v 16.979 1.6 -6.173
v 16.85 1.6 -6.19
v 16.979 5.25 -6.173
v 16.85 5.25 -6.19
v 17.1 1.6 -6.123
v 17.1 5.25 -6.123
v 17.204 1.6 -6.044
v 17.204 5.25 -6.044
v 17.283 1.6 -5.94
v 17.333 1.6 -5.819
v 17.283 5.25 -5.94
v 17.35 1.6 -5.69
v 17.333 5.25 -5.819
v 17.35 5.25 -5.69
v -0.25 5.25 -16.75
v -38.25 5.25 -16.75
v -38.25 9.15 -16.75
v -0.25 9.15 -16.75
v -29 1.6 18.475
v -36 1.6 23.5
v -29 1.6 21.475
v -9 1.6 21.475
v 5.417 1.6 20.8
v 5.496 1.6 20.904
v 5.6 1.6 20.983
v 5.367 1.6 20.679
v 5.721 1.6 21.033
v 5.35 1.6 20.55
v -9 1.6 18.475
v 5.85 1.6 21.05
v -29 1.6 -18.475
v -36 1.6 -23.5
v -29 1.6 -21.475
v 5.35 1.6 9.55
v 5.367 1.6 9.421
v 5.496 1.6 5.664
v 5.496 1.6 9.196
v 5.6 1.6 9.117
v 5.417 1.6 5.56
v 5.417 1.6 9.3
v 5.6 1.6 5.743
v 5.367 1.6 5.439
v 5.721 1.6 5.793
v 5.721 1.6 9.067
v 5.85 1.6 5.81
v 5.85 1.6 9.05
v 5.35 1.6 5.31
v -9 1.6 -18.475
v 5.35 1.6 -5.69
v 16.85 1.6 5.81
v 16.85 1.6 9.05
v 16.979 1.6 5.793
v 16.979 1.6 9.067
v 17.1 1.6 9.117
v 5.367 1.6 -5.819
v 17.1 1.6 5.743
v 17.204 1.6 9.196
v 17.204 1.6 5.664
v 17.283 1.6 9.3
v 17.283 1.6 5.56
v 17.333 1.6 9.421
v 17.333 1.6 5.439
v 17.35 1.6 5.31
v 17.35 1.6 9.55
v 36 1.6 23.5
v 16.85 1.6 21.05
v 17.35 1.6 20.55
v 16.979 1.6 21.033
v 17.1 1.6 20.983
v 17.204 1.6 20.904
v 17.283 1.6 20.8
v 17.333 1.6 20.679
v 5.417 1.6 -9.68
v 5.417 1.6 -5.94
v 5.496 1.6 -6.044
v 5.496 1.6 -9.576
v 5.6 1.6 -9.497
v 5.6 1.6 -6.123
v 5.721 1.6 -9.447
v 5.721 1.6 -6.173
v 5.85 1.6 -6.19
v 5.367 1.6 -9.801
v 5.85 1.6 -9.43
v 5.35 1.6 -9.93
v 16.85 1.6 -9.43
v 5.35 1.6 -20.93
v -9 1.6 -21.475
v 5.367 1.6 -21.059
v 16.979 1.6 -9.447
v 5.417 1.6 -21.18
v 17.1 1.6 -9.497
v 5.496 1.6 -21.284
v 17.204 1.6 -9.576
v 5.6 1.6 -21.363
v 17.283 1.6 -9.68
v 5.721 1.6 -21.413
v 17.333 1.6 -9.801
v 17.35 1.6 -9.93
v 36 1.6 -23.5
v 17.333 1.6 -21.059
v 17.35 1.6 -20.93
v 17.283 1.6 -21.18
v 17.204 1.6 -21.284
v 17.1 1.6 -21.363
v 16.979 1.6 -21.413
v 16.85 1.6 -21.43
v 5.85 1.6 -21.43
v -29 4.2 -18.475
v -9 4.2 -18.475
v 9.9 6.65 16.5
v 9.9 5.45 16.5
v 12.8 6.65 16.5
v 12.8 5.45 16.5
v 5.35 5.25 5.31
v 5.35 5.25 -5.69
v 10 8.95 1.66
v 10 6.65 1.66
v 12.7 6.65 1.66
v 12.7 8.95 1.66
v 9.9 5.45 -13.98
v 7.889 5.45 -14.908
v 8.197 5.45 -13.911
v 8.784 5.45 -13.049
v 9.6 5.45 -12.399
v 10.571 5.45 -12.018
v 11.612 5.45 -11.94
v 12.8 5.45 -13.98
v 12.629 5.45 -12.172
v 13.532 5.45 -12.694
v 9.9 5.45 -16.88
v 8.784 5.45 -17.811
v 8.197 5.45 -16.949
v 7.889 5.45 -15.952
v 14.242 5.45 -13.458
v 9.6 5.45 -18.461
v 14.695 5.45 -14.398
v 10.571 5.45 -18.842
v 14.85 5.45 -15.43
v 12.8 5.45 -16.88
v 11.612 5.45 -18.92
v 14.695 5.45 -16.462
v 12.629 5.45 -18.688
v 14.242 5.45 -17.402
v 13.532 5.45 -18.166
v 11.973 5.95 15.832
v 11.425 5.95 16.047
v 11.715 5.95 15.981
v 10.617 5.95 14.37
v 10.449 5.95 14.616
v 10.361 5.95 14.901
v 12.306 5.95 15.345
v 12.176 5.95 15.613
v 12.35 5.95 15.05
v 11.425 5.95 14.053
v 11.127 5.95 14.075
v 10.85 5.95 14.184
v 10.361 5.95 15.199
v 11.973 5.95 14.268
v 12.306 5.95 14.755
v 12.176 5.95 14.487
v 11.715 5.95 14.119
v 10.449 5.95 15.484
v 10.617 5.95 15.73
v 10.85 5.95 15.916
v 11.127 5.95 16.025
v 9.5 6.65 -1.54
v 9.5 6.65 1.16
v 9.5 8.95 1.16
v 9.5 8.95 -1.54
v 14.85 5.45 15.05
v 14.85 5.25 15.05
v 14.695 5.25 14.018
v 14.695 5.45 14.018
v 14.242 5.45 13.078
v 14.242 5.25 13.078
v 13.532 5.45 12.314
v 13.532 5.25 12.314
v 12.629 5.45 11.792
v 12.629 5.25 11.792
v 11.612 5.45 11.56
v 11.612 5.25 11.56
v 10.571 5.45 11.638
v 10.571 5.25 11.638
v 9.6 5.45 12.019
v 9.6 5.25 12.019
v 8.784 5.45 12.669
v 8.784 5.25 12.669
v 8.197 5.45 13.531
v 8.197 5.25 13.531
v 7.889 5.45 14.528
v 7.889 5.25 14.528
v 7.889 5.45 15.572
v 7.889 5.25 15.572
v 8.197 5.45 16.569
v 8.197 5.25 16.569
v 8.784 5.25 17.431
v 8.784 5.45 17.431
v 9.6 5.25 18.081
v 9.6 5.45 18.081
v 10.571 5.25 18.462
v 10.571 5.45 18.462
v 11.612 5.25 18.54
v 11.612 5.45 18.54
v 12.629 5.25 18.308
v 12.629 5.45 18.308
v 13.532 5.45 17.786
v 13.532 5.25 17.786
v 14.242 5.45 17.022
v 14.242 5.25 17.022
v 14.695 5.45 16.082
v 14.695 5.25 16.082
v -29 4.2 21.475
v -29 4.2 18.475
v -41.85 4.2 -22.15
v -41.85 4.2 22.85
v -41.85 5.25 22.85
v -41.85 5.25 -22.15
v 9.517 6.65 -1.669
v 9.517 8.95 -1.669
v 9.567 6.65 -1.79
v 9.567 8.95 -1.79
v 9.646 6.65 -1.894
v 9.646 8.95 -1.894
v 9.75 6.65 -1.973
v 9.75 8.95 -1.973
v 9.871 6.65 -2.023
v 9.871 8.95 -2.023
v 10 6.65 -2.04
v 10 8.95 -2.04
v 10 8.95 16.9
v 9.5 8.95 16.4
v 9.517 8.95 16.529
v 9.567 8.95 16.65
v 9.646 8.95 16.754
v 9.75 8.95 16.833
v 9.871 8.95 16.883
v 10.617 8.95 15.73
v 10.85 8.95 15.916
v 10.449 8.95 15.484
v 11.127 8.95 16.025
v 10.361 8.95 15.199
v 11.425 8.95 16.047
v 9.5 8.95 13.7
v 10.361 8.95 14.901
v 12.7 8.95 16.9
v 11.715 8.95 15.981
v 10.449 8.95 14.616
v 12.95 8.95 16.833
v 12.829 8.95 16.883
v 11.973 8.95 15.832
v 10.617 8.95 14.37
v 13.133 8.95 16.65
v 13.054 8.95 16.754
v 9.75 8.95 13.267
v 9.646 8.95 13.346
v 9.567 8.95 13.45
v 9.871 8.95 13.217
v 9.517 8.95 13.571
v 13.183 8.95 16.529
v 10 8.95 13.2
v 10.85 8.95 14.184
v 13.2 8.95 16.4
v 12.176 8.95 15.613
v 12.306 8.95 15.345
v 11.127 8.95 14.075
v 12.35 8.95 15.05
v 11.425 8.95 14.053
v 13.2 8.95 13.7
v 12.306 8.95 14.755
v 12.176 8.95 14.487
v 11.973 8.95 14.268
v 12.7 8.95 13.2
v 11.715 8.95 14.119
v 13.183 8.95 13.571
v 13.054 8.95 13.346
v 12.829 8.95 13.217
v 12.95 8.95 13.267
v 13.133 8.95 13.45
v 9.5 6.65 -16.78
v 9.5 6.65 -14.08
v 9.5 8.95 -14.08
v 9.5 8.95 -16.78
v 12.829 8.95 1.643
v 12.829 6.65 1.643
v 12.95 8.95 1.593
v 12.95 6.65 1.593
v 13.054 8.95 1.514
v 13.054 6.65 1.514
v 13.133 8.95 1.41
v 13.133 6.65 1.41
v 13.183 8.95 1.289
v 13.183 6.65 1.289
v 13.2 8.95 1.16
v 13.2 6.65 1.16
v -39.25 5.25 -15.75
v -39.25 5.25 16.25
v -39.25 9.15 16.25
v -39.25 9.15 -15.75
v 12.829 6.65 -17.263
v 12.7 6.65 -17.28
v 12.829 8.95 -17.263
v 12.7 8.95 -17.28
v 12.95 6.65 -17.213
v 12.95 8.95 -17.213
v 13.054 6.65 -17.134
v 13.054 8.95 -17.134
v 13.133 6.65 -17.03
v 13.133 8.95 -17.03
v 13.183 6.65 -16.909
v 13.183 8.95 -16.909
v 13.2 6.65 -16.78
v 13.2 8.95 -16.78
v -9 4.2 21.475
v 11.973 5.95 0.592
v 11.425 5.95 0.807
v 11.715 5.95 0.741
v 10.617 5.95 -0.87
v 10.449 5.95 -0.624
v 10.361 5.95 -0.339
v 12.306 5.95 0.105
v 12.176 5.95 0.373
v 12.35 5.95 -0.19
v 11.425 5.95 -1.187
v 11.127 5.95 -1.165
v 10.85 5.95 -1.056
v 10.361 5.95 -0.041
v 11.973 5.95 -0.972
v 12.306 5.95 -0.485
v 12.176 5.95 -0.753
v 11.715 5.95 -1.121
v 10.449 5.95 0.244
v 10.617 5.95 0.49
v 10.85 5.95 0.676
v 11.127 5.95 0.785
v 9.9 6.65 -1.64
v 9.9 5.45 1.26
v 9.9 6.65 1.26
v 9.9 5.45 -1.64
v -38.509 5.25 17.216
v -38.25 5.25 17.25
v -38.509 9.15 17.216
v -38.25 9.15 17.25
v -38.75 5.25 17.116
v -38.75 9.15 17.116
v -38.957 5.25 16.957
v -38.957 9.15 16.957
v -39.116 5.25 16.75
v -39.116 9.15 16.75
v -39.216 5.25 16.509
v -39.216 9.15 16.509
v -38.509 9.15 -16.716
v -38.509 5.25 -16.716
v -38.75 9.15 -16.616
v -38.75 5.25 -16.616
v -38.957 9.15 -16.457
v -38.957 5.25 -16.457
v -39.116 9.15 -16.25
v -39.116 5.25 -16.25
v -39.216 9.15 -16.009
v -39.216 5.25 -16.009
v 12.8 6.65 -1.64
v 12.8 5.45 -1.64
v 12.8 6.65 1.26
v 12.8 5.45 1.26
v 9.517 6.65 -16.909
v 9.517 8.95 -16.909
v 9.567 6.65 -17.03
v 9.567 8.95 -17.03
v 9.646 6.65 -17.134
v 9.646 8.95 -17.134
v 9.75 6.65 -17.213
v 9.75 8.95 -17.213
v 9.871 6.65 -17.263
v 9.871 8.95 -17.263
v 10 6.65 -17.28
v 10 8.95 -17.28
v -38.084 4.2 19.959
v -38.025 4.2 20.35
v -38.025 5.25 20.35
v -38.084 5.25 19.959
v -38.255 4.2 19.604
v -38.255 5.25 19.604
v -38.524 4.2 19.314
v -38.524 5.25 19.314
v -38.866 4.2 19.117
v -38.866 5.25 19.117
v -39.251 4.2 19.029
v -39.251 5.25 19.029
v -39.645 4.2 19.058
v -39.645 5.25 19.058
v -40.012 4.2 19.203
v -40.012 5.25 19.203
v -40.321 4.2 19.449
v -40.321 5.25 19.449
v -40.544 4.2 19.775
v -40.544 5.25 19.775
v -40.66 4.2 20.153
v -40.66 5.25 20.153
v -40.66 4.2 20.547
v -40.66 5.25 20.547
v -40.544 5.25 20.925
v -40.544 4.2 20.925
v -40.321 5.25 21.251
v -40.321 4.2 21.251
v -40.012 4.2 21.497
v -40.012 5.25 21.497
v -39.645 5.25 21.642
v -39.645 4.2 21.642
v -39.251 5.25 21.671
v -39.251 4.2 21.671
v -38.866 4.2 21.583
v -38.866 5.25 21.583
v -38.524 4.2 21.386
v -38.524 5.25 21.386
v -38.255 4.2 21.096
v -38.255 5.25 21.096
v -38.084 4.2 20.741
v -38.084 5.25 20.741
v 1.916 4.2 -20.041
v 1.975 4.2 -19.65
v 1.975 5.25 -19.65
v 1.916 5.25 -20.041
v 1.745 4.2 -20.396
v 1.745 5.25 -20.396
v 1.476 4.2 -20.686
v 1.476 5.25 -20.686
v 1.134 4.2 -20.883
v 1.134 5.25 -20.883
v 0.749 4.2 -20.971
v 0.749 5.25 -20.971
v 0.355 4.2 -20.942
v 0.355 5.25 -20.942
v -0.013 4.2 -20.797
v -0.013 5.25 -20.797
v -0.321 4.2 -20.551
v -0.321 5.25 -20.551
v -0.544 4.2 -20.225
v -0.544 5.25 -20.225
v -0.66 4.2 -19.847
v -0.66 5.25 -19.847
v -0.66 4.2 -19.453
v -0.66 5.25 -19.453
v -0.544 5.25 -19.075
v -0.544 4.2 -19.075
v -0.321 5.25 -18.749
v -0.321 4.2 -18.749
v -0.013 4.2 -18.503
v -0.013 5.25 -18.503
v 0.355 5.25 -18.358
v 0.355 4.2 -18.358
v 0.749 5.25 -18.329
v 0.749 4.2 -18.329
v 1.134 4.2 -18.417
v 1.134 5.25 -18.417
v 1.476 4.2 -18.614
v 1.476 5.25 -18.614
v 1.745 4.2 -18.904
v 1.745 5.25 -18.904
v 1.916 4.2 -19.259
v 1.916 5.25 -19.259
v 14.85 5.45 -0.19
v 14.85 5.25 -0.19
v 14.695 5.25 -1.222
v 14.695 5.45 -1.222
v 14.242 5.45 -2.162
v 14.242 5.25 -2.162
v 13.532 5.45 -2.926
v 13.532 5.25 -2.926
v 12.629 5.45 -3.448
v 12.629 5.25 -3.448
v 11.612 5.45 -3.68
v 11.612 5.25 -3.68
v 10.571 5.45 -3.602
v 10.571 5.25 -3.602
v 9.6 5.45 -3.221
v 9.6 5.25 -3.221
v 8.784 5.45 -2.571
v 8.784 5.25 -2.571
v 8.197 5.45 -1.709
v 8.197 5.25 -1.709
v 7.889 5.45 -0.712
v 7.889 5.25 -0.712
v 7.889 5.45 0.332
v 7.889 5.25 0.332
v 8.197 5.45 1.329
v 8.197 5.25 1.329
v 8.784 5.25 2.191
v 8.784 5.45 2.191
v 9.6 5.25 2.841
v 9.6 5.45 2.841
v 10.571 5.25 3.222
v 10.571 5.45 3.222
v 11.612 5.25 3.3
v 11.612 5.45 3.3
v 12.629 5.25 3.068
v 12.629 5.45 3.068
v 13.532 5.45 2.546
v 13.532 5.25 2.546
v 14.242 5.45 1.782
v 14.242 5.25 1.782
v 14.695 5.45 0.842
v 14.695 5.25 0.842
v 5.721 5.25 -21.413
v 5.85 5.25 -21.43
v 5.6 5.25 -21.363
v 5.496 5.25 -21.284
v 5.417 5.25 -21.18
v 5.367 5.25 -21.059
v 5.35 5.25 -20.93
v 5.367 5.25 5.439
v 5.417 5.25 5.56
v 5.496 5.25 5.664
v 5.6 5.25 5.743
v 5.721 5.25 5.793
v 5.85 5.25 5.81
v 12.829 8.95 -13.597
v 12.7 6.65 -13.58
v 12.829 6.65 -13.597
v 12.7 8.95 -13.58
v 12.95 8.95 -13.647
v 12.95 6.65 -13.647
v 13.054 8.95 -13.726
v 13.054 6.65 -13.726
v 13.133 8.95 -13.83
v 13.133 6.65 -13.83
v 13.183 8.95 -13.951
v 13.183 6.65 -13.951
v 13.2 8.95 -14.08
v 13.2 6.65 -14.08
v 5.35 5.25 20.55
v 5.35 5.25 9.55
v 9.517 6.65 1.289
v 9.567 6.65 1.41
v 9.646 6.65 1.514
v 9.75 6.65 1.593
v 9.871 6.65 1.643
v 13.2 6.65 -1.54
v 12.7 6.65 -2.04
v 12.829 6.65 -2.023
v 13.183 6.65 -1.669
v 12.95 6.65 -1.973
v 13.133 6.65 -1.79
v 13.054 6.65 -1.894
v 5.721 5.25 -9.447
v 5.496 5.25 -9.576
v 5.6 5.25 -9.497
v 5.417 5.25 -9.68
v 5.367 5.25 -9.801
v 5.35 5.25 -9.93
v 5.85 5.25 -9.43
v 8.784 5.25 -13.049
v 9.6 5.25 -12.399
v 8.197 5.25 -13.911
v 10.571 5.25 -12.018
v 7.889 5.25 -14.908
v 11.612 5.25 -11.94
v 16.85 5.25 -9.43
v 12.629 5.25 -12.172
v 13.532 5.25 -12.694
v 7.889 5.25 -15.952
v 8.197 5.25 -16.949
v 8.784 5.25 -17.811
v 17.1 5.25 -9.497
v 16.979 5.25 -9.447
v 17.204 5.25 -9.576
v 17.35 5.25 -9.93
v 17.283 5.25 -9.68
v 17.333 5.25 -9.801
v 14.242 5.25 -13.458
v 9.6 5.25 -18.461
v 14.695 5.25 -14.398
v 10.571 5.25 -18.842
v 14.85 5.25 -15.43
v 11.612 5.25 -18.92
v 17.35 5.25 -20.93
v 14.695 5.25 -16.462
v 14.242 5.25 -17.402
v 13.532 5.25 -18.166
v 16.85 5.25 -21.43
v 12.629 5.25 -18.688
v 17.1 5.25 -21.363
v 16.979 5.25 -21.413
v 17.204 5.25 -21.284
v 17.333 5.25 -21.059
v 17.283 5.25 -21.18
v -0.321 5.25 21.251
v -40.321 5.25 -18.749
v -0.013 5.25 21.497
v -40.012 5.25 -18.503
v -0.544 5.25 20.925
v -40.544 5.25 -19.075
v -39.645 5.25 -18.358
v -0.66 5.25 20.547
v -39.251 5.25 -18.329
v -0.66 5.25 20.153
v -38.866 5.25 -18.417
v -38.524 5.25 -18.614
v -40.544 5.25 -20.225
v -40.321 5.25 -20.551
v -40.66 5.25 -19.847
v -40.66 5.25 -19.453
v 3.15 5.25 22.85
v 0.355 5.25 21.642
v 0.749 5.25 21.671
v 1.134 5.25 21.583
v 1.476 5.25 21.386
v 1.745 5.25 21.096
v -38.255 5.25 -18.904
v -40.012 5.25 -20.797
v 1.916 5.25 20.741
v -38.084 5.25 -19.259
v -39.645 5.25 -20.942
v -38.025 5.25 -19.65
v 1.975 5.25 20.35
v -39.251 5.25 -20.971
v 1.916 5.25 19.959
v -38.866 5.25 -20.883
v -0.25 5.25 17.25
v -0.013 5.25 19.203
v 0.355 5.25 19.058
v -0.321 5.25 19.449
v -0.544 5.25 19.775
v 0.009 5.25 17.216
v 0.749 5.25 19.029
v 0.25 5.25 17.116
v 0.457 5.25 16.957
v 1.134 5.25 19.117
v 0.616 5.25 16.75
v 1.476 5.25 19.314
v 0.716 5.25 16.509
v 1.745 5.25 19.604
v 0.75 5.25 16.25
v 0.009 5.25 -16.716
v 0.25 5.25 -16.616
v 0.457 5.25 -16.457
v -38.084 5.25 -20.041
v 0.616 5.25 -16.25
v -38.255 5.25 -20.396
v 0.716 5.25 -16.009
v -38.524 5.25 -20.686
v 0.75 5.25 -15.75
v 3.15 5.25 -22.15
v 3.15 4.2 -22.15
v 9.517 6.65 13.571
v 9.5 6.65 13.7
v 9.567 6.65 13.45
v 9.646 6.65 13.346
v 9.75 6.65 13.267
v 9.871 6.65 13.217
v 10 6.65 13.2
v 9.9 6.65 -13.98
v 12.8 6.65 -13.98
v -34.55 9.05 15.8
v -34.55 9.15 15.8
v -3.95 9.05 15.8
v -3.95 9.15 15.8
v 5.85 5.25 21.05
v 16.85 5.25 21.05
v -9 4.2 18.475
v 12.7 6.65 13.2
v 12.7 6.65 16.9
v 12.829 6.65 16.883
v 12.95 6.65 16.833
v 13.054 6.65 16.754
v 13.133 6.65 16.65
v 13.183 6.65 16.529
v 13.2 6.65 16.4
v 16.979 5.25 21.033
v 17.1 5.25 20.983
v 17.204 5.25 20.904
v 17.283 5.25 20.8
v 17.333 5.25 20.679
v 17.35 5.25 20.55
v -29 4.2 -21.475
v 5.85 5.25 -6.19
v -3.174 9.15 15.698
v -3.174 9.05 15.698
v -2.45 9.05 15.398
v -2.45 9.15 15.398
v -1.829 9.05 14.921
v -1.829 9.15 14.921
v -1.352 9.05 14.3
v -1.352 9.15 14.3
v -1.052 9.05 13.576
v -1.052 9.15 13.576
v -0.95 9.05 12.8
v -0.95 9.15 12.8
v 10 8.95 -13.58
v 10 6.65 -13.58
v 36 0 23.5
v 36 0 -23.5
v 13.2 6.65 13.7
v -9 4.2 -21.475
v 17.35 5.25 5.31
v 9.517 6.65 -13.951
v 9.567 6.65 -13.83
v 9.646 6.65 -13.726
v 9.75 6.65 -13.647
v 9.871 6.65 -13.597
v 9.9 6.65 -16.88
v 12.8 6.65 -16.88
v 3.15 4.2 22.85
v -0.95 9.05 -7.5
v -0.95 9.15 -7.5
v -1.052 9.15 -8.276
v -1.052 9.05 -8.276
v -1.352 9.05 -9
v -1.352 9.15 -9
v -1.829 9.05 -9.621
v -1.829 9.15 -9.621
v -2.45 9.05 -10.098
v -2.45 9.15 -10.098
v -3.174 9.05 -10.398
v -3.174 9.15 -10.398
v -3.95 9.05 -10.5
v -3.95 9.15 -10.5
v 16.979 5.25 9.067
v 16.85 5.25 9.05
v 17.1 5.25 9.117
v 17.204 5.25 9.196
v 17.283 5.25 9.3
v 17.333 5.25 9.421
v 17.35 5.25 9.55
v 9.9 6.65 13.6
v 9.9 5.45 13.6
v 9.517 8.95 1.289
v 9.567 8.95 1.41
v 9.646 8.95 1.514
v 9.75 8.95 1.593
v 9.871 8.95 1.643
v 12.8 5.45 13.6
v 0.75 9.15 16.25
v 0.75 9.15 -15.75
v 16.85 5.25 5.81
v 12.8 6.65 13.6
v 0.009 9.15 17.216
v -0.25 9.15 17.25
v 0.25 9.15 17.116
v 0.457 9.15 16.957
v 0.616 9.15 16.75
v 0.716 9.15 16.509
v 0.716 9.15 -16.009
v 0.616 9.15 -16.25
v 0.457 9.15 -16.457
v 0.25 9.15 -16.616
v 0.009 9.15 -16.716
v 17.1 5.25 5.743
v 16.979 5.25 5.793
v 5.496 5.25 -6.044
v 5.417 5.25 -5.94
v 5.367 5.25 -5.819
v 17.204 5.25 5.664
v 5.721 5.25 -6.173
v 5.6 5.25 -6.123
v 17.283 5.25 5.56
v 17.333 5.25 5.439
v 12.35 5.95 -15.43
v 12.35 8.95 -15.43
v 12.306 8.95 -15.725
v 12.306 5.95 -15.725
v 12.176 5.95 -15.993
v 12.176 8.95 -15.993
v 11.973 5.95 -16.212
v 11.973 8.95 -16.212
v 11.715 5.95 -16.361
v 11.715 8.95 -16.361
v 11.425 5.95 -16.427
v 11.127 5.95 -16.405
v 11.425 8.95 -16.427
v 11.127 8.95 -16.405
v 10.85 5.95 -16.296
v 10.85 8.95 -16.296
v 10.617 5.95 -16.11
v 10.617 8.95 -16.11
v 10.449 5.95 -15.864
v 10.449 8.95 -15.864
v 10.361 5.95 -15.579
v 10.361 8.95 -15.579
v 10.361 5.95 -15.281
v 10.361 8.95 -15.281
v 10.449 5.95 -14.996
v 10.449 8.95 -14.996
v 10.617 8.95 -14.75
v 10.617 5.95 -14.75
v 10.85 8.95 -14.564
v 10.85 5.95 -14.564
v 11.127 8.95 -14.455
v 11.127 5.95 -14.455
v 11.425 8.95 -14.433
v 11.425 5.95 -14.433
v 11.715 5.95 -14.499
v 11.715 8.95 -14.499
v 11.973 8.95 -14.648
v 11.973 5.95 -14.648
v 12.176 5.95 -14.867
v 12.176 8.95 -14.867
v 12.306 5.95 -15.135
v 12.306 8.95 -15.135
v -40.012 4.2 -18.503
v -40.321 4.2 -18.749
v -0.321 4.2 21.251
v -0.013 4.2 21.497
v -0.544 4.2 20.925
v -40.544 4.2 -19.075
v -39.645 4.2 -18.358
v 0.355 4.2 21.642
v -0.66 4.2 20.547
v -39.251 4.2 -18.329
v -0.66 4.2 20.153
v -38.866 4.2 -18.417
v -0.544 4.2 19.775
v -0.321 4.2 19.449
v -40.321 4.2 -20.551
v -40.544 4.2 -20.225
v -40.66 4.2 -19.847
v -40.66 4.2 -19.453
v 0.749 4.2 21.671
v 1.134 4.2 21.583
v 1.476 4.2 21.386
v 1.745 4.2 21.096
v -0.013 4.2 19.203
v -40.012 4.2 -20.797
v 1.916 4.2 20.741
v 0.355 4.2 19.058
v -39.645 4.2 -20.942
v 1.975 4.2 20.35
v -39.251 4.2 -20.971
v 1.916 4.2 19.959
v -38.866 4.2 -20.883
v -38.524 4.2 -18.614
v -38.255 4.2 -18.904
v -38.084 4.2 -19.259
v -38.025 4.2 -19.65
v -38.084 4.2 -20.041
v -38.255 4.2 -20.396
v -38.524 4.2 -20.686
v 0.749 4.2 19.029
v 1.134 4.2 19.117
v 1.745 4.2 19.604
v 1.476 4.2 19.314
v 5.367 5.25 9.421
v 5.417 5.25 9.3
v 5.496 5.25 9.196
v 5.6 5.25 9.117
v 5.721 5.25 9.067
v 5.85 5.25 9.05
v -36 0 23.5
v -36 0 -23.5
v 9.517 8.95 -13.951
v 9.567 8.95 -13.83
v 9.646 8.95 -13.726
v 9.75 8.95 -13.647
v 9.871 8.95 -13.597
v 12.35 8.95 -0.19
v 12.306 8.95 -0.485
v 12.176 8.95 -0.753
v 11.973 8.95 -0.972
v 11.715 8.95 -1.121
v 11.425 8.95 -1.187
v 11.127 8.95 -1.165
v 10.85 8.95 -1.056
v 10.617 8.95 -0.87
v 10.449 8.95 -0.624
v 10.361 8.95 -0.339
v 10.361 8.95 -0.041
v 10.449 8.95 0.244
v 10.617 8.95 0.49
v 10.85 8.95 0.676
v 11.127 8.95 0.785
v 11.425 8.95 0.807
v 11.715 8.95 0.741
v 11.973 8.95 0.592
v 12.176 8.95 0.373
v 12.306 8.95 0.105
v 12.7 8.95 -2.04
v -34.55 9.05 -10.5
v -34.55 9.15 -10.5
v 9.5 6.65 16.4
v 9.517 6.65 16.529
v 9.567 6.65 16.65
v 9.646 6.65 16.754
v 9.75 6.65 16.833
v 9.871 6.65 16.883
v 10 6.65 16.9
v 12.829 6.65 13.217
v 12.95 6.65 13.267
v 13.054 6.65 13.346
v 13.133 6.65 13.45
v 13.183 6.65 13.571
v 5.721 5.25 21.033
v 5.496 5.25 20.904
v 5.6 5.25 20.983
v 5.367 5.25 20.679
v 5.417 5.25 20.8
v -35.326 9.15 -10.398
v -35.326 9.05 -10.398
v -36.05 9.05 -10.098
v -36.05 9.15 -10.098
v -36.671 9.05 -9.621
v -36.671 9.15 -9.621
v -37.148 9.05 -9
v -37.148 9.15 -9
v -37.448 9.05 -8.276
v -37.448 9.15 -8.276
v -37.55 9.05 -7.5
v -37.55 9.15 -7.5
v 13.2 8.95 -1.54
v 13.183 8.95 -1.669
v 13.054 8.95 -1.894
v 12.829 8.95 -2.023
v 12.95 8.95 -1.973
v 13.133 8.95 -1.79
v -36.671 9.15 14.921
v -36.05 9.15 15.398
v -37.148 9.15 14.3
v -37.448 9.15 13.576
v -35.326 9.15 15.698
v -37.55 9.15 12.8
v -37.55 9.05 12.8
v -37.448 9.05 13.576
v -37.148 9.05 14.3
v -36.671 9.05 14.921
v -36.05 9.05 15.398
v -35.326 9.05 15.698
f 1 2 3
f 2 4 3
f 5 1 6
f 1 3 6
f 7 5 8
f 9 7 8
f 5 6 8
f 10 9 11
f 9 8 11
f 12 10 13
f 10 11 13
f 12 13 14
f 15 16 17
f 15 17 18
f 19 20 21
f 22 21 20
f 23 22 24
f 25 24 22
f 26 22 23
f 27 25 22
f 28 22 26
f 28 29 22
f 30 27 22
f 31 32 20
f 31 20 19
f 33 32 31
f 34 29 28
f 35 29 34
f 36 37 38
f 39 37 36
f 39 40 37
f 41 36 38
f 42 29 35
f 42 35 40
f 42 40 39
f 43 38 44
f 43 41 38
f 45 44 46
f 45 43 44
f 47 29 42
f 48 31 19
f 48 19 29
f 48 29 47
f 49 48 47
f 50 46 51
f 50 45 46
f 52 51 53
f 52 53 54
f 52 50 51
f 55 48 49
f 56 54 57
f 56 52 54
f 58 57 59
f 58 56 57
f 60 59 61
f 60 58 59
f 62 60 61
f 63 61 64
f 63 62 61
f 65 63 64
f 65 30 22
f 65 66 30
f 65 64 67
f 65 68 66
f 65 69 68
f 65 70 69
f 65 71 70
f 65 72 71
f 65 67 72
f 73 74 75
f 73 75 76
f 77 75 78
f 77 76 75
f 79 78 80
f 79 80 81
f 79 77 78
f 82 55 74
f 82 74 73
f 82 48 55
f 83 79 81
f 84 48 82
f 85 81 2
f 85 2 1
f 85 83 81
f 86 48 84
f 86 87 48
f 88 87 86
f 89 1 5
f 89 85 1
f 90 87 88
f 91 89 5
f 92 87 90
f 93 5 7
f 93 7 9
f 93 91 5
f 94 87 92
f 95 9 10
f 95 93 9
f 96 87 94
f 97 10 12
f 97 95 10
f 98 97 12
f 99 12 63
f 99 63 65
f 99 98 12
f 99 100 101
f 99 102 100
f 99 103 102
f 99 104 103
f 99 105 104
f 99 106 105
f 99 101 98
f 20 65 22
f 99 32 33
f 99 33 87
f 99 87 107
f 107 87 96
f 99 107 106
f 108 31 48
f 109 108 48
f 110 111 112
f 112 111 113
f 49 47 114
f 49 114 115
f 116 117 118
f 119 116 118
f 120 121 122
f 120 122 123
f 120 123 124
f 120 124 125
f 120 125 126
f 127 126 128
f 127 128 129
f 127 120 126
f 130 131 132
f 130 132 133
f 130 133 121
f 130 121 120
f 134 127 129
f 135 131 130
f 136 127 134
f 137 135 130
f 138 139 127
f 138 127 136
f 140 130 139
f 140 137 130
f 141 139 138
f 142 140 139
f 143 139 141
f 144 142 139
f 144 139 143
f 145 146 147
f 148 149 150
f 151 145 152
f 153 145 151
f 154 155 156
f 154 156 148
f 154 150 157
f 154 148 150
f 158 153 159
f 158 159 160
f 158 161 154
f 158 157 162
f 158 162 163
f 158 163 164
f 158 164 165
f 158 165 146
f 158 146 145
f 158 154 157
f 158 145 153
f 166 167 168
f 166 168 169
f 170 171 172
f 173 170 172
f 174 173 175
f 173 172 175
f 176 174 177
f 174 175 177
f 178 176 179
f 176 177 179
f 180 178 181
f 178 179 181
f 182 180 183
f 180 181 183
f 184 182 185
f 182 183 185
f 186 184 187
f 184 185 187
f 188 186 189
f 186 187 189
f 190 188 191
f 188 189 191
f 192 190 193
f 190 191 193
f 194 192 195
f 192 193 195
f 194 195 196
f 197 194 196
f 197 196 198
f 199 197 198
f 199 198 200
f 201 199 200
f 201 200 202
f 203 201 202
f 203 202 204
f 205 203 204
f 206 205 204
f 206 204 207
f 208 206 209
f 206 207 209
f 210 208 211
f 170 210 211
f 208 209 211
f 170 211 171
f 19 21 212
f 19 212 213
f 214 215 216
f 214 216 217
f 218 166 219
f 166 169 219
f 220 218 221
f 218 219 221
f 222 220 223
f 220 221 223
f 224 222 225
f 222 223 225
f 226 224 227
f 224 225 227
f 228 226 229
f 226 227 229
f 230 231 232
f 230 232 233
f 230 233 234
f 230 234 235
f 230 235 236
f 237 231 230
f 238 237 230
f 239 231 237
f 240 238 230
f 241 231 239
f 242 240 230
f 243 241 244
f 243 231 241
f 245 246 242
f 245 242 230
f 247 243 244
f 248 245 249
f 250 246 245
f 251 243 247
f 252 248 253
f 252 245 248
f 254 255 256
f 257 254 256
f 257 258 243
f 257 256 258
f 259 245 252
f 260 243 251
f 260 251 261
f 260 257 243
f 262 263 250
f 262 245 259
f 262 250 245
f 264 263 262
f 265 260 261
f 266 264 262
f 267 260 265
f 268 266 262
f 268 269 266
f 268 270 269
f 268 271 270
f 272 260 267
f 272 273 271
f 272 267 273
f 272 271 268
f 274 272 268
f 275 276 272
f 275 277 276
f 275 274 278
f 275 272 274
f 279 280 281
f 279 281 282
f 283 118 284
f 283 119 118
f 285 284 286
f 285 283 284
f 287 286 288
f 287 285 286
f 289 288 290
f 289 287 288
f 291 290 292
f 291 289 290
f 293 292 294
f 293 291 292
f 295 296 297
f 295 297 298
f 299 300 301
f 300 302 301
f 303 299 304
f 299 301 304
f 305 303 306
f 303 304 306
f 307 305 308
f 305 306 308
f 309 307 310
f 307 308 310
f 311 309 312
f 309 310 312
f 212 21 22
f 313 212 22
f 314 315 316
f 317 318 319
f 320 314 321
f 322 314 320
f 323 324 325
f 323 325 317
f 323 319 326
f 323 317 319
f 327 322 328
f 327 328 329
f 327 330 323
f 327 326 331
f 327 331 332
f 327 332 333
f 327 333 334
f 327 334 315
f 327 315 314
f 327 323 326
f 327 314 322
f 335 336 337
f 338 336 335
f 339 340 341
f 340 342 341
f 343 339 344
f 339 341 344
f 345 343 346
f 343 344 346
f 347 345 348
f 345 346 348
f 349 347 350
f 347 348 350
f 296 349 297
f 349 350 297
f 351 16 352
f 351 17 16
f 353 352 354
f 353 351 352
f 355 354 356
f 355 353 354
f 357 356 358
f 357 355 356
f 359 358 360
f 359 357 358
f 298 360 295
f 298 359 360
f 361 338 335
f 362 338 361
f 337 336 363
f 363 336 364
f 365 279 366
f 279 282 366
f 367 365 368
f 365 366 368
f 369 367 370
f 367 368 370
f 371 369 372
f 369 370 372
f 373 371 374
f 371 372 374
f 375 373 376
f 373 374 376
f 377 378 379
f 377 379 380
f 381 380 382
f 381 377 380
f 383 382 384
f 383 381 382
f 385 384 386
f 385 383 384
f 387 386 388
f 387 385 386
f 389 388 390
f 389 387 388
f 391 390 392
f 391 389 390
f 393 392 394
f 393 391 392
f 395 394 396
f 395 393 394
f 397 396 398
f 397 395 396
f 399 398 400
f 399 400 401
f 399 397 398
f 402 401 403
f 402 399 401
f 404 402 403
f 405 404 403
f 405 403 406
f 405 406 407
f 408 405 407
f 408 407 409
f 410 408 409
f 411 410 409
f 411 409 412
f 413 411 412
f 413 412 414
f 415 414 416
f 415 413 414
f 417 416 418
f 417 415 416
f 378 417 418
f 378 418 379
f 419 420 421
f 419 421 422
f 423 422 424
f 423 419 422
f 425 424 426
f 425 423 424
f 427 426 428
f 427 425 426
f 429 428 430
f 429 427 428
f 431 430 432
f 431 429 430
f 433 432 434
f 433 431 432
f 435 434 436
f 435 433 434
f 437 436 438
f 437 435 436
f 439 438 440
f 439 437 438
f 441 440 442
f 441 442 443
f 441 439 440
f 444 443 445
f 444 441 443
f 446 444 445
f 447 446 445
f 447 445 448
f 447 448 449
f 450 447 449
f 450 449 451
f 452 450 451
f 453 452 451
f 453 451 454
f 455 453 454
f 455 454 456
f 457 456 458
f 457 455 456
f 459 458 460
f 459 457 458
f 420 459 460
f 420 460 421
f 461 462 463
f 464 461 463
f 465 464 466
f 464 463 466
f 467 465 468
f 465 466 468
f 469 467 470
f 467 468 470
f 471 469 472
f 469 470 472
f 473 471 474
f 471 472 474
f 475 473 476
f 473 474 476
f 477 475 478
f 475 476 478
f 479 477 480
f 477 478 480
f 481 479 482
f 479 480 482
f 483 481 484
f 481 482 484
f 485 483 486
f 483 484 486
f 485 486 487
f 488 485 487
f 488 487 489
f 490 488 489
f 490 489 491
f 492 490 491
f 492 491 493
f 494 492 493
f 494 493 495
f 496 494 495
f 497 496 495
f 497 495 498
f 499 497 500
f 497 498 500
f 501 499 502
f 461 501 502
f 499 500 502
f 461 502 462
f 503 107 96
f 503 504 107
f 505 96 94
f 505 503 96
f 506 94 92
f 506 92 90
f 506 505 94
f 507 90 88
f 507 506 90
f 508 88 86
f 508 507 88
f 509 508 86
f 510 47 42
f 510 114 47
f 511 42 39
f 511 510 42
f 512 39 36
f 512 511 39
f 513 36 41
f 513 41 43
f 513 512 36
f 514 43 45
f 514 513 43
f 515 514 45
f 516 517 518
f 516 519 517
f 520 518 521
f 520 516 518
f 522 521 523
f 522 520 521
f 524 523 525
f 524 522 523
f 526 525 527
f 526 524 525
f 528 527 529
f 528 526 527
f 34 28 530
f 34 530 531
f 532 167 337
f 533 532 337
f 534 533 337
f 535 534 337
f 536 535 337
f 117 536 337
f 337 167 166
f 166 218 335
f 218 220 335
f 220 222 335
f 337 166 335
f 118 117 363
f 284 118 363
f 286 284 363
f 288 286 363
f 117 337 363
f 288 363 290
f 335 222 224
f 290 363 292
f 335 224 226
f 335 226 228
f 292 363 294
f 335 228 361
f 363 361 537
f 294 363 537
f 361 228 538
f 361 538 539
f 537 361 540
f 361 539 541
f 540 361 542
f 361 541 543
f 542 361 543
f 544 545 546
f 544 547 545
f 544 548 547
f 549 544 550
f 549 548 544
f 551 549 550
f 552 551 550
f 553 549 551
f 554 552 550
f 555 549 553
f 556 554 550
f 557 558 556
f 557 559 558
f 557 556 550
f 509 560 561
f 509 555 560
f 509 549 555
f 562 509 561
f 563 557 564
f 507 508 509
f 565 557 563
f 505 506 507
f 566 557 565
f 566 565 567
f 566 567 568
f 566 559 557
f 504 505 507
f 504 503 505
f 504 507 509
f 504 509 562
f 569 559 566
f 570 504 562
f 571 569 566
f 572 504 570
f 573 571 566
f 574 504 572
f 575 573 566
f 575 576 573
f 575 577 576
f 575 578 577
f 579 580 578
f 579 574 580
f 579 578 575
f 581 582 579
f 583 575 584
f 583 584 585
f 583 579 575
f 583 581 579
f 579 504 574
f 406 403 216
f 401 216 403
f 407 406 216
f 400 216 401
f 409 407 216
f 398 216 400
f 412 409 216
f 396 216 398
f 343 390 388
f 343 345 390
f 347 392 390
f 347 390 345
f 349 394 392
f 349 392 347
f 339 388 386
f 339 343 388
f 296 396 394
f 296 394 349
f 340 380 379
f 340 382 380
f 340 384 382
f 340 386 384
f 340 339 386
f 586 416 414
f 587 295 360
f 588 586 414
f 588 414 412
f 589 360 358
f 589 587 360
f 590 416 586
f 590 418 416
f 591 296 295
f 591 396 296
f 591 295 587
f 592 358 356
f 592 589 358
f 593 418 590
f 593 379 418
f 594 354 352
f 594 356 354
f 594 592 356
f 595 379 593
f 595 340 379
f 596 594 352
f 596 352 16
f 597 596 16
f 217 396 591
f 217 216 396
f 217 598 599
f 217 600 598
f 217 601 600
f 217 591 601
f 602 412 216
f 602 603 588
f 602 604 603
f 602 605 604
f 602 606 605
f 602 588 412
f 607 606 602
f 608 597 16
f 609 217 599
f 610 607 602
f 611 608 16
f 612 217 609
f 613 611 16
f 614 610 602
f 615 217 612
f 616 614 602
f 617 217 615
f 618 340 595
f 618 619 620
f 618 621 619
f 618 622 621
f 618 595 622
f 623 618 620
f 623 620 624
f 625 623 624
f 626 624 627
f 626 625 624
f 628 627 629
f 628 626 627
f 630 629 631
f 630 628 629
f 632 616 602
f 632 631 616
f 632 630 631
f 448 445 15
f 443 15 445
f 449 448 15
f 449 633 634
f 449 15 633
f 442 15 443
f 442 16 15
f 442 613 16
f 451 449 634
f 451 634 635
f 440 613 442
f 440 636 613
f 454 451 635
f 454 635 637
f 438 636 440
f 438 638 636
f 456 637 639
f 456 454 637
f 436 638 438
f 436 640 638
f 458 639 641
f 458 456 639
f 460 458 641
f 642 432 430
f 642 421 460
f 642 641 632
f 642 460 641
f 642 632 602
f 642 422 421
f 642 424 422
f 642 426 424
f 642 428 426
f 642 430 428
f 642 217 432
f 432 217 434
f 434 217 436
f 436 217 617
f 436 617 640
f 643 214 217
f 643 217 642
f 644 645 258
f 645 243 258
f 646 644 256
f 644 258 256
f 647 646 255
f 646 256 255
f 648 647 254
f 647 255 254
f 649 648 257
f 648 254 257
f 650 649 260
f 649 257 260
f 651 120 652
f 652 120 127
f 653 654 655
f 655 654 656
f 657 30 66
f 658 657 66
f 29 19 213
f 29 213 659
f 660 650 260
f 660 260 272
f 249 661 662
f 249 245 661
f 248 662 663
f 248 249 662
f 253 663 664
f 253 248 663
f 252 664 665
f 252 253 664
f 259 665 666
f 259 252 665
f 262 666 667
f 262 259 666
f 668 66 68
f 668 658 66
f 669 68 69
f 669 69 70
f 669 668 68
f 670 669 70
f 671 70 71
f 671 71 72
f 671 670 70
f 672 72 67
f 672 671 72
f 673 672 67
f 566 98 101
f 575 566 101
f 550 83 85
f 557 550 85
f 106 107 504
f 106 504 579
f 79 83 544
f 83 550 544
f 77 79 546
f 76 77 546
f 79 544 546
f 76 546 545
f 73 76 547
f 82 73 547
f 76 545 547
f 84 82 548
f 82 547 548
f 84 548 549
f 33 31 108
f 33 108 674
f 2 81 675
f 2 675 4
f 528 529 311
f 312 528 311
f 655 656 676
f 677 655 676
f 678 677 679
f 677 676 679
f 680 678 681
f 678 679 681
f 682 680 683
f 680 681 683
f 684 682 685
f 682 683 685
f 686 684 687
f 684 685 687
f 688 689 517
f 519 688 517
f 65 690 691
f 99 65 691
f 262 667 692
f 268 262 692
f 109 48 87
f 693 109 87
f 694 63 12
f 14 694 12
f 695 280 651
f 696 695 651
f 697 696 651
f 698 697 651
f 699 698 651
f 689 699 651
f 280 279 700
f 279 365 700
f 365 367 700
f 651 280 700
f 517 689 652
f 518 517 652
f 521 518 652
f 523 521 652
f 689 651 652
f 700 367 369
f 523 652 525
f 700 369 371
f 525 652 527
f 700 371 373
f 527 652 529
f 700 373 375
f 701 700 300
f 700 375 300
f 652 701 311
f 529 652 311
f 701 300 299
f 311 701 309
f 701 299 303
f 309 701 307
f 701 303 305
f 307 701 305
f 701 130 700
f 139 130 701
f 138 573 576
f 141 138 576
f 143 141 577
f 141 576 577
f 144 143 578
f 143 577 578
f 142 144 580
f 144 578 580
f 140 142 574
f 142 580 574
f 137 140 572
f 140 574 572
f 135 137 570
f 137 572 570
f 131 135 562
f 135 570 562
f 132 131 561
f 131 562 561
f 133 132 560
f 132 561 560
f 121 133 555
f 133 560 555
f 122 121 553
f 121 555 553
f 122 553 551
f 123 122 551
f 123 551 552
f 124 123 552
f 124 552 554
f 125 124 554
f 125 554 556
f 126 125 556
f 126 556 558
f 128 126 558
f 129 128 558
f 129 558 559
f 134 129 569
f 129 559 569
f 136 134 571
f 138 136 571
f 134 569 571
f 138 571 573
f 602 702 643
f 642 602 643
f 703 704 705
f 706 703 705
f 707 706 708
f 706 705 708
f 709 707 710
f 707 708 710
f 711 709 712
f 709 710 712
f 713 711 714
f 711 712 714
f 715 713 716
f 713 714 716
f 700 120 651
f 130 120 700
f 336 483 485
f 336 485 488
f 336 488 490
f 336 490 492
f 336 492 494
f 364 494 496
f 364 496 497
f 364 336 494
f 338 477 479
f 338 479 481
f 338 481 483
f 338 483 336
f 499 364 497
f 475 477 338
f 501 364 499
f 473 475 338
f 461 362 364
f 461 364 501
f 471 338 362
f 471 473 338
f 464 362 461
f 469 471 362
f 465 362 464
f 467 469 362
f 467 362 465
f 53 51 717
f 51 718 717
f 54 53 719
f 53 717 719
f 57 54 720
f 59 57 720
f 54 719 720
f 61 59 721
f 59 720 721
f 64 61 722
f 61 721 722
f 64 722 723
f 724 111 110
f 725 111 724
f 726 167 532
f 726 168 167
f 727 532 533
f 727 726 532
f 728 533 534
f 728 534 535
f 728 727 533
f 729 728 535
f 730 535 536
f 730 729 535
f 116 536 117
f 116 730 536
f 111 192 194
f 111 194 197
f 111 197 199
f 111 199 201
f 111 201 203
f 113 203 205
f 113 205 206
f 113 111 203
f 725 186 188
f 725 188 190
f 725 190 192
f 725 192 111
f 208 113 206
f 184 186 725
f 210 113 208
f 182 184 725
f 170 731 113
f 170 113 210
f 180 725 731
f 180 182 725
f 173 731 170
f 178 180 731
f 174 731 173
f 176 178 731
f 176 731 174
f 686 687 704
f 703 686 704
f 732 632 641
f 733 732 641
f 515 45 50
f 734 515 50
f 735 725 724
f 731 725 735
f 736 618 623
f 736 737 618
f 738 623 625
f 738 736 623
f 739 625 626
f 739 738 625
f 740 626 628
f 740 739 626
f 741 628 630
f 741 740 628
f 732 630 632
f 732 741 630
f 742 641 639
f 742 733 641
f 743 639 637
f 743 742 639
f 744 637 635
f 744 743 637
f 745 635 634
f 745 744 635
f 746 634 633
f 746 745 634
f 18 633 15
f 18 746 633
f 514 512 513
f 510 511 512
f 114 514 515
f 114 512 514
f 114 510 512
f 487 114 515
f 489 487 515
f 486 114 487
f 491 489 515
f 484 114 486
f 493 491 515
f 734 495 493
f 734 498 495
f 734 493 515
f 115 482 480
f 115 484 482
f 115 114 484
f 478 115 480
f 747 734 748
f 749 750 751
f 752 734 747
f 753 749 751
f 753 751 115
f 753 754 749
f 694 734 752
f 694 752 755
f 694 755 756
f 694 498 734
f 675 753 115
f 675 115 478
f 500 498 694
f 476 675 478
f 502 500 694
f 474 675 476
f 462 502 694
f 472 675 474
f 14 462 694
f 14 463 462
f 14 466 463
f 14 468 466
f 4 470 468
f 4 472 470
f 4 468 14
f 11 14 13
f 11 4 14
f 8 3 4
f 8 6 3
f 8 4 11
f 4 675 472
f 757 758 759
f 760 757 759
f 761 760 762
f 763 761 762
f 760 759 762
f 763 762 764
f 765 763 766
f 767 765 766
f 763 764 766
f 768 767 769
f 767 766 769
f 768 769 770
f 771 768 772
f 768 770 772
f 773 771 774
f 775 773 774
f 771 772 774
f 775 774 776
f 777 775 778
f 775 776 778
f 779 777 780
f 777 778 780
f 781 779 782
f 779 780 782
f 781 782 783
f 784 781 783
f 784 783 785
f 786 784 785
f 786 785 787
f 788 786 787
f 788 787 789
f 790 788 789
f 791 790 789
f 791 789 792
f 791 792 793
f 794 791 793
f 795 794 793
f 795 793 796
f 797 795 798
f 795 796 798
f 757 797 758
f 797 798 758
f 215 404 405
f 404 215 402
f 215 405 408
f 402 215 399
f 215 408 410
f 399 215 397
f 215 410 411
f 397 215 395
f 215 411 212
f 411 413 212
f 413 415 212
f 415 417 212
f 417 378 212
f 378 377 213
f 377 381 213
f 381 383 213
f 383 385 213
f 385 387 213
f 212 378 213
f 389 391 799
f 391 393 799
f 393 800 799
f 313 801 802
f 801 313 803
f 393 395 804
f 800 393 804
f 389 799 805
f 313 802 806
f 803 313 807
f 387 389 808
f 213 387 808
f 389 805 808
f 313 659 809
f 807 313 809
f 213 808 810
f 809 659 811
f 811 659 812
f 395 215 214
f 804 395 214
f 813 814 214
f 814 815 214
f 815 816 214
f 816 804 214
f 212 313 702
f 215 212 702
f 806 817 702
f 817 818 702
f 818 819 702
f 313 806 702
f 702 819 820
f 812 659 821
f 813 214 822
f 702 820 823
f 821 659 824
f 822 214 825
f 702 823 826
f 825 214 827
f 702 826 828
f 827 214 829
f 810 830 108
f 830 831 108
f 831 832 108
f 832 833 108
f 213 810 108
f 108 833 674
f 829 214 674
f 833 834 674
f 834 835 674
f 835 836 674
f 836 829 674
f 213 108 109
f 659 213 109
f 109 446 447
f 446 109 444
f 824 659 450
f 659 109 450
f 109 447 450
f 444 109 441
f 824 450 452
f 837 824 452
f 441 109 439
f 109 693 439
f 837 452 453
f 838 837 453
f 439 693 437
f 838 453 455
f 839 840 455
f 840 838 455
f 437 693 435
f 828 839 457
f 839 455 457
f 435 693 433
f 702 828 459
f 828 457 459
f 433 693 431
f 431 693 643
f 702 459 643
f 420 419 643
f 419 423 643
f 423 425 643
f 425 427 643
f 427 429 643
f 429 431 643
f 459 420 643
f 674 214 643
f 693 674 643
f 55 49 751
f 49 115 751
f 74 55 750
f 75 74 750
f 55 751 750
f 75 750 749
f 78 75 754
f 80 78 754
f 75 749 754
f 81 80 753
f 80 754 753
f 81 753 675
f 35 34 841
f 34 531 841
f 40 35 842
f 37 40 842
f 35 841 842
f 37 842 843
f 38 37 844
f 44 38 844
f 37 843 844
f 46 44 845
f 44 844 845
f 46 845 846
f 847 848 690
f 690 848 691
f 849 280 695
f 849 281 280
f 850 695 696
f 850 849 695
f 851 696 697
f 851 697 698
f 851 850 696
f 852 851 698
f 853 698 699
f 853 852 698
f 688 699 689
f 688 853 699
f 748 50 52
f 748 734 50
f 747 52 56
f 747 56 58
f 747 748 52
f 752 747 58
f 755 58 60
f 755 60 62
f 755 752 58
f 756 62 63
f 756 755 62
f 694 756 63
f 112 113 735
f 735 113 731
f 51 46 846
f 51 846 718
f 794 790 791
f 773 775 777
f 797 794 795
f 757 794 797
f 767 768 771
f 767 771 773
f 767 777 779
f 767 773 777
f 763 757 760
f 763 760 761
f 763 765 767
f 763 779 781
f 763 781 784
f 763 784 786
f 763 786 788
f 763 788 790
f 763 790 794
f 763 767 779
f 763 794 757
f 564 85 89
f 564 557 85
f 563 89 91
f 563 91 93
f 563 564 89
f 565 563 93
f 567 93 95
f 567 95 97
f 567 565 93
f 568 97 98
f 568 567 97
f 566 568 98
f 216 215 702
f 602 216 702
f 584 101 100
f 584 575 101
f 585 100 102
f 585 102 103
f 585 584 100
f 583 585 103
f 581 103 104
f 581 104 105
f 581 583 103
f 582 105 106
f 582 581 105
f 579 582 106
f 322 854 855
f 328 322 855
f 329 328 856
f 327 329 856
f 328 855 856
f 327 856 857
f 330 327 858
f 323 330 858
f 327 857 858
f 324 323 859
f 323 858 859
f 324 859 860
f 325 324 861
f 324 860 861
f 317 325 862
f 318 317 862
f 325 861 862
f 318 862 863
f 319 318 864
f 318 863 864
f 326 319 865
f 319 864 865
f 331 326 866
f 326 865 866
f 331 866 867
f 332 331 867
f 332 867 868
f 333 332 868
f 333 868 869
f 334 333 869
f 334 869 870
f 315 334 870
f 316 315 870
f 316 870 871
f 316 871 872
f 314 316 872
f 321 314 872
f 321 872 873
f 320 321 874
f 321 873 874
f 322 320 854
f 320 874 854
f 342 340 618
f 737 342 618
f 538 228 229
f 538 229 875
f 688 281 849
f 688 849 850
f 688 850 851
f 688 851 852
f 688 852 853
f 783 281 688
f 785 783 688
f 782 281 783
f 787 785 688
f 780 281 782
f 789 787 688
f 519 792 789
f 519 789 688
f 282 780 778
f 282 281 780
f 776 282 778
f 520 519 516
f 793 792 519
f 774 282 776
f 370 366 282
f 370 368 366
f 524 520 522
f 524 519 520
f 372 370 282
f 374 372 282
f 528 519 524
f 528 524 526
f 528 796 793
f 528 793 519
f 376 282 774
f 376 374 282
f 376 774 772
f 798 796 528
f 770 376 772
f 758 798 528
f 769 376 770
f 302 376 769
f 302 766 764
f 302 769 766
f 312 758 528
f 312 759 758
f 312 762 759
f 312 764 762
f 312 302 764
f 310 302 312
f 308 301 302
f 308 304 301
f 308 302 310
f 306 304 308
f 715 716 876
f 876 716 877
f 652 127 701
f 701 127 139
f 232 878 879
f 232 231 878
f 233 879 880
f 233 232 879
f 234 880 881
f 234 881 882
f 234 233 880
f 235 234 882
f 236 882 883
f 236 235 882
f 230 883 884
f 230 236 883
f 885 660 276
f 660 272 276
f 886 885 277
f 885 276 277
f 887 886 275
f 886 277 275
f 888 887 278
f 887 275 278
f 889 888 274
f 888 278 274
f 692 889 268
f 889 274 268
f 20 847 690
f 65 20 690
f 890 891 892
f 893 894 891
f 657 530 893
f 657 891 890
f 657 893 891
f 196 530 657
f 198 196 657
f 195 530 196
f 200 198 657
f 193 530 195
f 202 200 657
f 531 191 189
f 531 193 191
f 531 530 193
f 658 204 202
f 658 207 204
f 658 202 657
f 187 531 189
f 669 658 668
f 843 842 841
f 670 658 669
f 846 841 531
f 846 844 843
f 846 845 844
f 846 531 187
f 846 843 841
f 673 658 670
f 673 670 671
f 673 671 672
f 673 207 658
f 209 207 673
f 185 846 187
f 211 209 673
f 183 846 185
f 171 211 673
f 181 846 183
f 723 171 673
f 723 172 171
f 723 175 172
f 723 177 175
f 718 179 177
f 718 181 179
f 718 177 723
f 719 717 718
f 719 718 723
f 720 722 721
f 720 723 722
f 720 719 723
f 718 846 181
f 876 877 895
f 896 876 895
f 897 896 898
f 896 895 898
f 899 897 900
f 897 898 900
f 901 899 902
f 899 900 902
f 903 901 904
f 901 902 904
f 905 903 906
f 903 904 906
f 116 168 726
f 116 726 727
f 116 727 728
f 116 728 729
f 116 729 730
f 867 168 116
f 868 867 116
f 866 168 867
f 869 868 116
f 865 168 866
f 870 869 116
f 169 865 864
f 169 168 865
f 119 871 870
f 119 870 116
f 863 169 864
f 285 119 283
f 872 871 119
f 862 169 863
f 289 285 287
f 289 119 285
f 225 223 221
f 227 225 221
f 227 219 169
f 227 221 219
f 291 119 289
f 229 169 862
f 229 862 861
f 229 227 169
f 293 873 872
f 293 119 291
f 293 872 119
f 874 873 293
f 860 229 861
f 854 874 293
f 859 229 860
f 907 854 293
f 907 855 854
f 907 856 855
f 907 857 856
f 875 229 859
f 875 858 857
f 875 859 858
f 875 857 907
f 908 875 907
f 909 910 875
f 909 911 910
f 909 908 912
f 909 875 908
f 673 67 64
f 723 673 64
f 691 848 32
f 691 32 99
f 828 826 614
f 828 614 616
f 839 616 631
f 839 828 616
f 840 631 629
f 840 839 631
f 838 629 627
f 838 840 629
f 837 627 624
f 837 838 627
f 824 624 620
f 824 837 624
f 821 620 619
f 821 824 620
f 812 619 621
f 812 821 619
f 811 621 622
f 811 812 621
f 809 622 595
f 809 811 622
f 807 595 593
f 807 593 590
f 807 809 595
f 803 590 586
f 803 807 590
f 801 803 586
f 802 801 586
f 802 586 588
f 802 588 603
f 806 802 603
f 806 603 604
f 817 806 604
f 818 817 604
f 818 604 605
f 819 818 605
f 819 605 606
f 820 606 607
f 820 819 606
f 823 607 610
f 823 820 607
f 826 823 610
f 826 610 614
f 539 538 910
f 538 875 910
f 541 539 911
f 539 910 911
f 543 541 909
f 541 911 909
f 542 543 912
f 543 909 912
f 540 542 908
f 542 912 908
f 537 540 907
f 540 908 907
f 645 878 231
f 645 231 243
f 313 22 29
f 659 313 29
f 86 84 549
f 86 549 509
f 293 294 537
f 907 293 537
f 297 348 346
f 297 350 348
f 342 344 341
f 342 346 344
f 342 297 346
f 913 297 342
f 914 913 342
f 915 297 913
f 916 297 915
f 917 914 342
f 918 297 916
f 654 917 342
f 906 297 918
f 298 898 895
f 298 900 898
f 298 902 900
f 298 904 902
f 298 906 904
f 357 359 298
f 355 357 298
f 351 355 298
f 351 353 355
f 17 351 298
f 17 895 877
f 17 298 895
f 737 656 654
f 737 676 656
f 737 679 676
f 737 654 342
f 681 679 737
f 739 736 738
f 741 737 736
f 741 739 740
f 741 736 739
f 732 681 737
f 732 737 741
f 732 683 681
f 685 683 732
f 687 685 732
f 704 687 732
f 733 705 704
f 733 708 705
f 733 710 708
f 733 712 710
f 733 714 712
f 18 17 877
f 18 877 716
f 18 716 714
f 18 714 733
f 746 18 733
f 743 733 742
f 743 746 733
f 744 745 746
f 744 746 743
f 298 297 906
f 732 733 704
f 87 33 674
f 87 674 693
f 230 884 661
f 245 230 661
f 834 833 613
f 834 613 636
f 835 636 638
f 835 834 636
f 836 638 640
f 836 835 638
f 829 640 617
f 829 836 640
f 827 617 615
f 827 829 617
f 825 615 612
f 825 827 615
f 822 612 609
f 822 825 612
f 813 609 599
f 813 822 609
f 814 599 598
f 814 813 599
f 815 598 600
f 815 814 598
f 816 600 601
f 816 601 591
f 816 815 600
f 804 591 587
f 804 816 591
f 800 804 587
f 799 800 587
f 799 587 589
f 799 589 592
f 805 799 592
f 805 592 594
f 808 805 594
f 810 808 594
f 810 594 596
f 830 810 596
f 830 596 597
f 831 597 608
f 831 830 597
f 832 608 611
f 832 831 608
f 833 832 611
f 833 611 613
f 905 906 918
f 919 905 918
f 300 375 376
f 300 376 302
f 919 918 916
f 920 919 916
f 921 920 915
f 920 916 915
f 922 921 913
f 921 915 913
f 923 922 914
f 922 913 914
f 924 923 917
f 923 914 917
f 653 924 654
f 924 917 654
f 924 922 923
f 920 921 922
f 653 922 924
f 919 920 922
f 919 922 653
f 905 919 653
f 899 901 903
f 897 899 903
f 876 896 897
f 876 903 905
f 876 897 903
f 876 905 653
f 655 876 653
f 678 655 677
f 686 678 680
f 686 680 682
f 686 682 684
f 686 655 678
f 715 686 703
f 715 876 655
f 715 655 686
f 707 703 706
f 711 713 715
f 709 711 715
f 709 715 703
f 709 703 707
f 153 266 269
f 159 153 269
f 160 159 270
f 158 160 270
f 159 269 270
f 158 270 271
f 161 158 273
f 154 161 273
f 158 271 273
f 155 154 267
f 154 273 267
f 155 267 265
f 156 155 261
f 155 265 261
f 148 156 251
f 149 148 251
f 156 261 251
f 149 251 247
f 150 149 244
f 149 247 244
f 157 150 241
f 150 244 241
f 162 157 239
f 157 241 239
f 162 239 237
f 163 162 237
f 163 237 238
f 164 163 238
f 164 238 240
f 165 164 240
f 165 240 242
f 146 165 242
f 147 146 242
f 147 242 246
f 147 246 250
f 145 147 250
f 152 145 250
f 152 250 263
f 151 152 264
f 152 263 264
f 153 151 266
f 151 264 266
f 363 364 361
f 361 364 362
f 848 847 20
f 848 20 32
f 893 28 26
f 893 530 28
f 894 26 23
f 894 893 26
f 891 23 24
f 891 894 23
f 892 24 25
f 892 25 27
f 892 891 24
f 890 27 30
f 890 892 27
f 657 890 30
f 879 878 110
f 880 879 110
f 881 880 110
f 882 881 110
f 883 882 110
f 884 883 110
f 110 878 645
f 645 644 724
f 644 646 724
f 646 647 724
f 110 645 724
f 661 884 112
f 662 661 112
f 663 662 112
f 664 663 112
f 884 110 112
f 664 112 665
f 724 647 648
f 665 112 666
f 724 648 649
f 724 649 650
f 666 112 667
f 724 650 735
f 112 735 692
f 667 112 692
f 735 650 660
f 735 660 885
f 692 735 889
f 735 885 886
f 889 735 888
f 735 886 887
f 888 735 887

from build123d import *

# Parameters (mm, degrees)
SKETCH1_W              = 72
SKETCH1_H              = 47
BOSS_EXTRUDE1_DEPTH    = 1.6
SKETCH2_W              = 20
SKETCH2_H              = 3
BOSS_EXTRUDE2_DEPTH    = 2.6
SKETCH3_W              = 45
SKETCH3_H              = 45
SKETCH3_R              = 1.325
BOSS_EXTRUDE3_DEPTH    = 1.05
SKETCH4_W              = 40
SKETCH4_H              = 34
BOSS_EXTRUDE4_DEPTH    = 3.9
CUT_EXTRUDE1_DEPTH     = 0.1
FILLET1_R              = 1
SKETCH6_W              = 12
SKETCH6_H              = 12
BOSS_EXTRUDE5_DEPTH    = 3.65
SKETCH7_R              = 3.5
BOSS_EXTRUDE6_DEPTH    = 0.2
SKETCH8_W              = 2.9
SKETCH8_H              = 2.9
BOSS_EXTRUDE7_DEPTH    = 1.2
SKETCH9_W              = 3.7
SKETCH9_H              = 3.7
BOSS_EXTRUDE8_DEPTH    = 2.3
FILLET2_R              = 0.5
SKETCH10_R             = 1
CUT_EXTRUDE2_DEPTH     = 3
LPATTERN1_COUNT        = 3
LPATTERN1_PITCH        = 15.24
FILLET2_OF_LPATTERN1_R = 0.5


with BuildPart() as part:
    # Sketch1 → Boss-Extrude1 (new body)
    with BuildSketch(Plane(origin=(0, 0, 0), x_dir=(1, 0, 0), z_dir=(0, 1, 0))):
        Rectangle(SKETCH1_W, SKETCH1_H)
    extrude(amount=BOSS_EXTRUDE1_DEPTH)

    # Sketch2 → Boss-Extrude2 (add)
    with BuildSketch(Plane(origin=(0, 1.6, 0), x_dir=(1, 0, 0), z_dir=(0, 1, 0))):
        with Locations((-19, -19.975114796)):
            Rectangle(SKETCH2_W, SKETCH2_H)
        with Locations((-19, 19.975114796)):
            Rectangle(SKETCH2_W, SKETCH2_H)
    extrude(amount=BOSS_EXTRUDE2_DEPTH)

    # Sketch3 → Boss-Extrude3 (add)
    with BuildSketch(Plane(origin=(0, 4.2, 0), x_dir=(1, 0, 0), z_dir=(0, 1, 0))):
        with Locations((-19.35, -0.35)):
            Rectangle(SKETCH3_W, SKETCH3_H)
        with Locations((-39.35, 19.65)):
            Circle(SKETCH3_R, mode=Mode.SUBTRACT)
        with Locations((0.65, 19.65)):
            Circle(SKETCH3_R, mode=Mode.SUBTRACT)
        with Locations((0.65, -20.35)):
            Circle(SKETCH3_R, mode=Mode.SUBTRACT)
        with Locations((-39.35, -20.35)):
            Circle(SKETCH3_R, mode=Mode.SUBTRACT)
    extrude(amount=BOSS_EXTRUDE3_DEPTH)

    # Sketch4 → Boss-Extrude4 (add)
    with BuildSketch(Plane(origin=(0, 5.25, 0), x_dir=(1, 0, 0), z_dir=(0, 1, 0))):
        with Locations((-19.25, -0.25)):
            Rectangle(SKETCH4_W, SKETCH4_H)
    extrude(amount=BOSS_EXTRUDE4_DEPTH)

    # Sketch5 → Cut-Extrude1 (cut)
    with BuildSketch(Plane(origin=(0, 9.15, 0), x_dir=(1, 0, 0), z_dir=(0, 1, 0))):
        with BuildLine():
            Line((-34.55, -15.8), (-3.95, -15.8))
            ThreePointArc((-3.95, -15.8), (-1.828679656, -14.921320344), (-0.95, -12.8))
            Line((-0.95, -12.8), (-0.95, 7.5))
            ThreePointArc((-0.95, 7.5), (-1.828679656, 9.621320344), (-3.95, 10.5))
            Line((-3.95, 10.5), (-34.55, 10.5))
            ThreePointArc((-34.55, 10.5), (-36.671320344, 9.621320344), (-37.55, 7.5))
            Line((-37.55, 7.5), (-37.55, -12.8))
            ThreePointArc((-37.55, -12.8), (-36.671320344, -14.921320344), (-34.55, -15.8))
        make_face()
    extrude(amount=-CUT_EXTRUDE1_DEPTH, mode=Mode.SUBTRACT)

    # Fillet1
    fillet1_edges = [part.edges().sort_by_distance(p)[0] for p in [
        (-39.25, 7.2, -16.75),
        (-39.25, 7.2, 17.25),
        (0.75, 7.2, 17.25),
        (0.75, 7.2, -16.75),
    ]]
    fillet(fillet1_edges, radius=FILLET1_R)

    # Sketch6 → Boss-Extrude5 (add)
    with BuildSketch(Plane(origin=(0, 1.6, 0), x_dir=(1, 0, 0), z_dir=(0, 1, 0))):
        with Locations((11.35, -15.05)):
            Rectangle(SKETCH6_W, SKETCH6_H)
    boss_extrude5 = extrude(amount=BOSS_EXTRUDE5_DEPTH)

    # Sketch7 → Boss-Extrude6 (add)
    with BuildSketch(Plane(origin=(0, 5.25, 0), x_dir=(1, 0, 0), z_dir=(0, 1, 0))):
        with Locations((11.35, -15.05)):
            Circle(SKETCH7_R)
    boss_extrude6 = extrude(amount=BOSS_EXTRUDE6_DEPTH)

    # Sketch8 → Boss-Extrude7 (add)
    with BuildSketch(Plane(origin=(0, 5.45, 0), x_dir=(1, 0, 0), z_dir=(0, 1, 0))):
        with Locations((11.35, -15.05)):
            Rectangle(SKETCH8_W, SKETCH8_H)
    boss_extrude7 = extrude(amount=BOSS_EXTRUDE7_DEPTH)

    # Sketch9 → Boss-Extrude8 (add)
    with BuildSketch(Plane(origin=(0, 6.65, 0), x_dir=(1, 0, 0), z_dir=(0, 1, 0))):
        with Locations((11.35, -15.05)):
            Rectangle(SKETCH9_W, SKETCH9_H)
    boss_extrude8 = extrude(amount=BOSS_EXTRUDE8_DEPTH)

    # Fillet2
    fillet2_edges = [part.edges().sort_by_distance(p)[0] for p in [
        (5.35, 3.425, 9.05),
        (5.35, 3.425, 21.05),
        (17.35, 3.425, 21.05),
        (17.35, 3.425, 9.05),
        (9.5, 7.8, 13.2),
        (9.5, 7.8, 16.9),
        (13.2, 7.8, 16.9),
        (13.2, 7.8, 13.2),
    ]]
    fillet(fillet2_edges, radius=FILLET2_R)

    # Sketch10 → Cut-Extrude2 (cut)
    with BuildSketch(Plane(origin=(0, 8.95, 0), x_dir=(1, 0, 0), z_dir=(0, 1, 0))):
        with Locations((11.35, -15.05)):
            Circle(SKETCH10_R)
    cut_extrude2 = extrude(amount=-CUT_EXTRUDE2_DEPTH, mode=Mode.SUBTRACT)

    # LPattern1: Boss-Extrude5, Boss-Extrude6, Boss-Extrude7, Boss-Extrude8, Cut-Extrude2 ×3
    with Locations(*[(0, 0, -i * LPATTERN1_PITCH) for i in range(1, LPATTERN1_COUNT)]):
        add(boss_extrude5)
        add(boss_extrude6)
        add(boss_extrude7)
        add(boss_extrude8)
        add(cut_extrude2, mode=Mode.SUBTRACT)

    # Fillet2 of LPattern1
    fillet2_of_lpattern1_edges = [part.edges().sort_by_distance(p)[0] for p in [
        (5.35, 3.425, -6.19),
        (5.35, 3.425, 5.81),
        (17.35, 3.425, 5.81),
        (17.35, 3.425, -6.19),
        (9.5, 7.8, -2.04),
        (9.5, 7.8, 1.66),
        (13.2, 7.8, 1.66),
        (13.2, 7.8, -2.04),
        (5.35, 3.425, -21.43),
        (5.35, 3.425, -9.43),
        (17.35, 3.425, -9.43),
        (17.35, 3.425, -21.43),
        (9.5, 7.8, -17.28),
        (9.5, 7.8, -13.58),
        (13.2, 7.8, -13.58),
        (13.2, 7.8, -17.28),
    ]]
    fillet(fillet2_of_lpattern1_edges, radius=FILLET2_OF_LPATTERN1_R)


solid = part.part
